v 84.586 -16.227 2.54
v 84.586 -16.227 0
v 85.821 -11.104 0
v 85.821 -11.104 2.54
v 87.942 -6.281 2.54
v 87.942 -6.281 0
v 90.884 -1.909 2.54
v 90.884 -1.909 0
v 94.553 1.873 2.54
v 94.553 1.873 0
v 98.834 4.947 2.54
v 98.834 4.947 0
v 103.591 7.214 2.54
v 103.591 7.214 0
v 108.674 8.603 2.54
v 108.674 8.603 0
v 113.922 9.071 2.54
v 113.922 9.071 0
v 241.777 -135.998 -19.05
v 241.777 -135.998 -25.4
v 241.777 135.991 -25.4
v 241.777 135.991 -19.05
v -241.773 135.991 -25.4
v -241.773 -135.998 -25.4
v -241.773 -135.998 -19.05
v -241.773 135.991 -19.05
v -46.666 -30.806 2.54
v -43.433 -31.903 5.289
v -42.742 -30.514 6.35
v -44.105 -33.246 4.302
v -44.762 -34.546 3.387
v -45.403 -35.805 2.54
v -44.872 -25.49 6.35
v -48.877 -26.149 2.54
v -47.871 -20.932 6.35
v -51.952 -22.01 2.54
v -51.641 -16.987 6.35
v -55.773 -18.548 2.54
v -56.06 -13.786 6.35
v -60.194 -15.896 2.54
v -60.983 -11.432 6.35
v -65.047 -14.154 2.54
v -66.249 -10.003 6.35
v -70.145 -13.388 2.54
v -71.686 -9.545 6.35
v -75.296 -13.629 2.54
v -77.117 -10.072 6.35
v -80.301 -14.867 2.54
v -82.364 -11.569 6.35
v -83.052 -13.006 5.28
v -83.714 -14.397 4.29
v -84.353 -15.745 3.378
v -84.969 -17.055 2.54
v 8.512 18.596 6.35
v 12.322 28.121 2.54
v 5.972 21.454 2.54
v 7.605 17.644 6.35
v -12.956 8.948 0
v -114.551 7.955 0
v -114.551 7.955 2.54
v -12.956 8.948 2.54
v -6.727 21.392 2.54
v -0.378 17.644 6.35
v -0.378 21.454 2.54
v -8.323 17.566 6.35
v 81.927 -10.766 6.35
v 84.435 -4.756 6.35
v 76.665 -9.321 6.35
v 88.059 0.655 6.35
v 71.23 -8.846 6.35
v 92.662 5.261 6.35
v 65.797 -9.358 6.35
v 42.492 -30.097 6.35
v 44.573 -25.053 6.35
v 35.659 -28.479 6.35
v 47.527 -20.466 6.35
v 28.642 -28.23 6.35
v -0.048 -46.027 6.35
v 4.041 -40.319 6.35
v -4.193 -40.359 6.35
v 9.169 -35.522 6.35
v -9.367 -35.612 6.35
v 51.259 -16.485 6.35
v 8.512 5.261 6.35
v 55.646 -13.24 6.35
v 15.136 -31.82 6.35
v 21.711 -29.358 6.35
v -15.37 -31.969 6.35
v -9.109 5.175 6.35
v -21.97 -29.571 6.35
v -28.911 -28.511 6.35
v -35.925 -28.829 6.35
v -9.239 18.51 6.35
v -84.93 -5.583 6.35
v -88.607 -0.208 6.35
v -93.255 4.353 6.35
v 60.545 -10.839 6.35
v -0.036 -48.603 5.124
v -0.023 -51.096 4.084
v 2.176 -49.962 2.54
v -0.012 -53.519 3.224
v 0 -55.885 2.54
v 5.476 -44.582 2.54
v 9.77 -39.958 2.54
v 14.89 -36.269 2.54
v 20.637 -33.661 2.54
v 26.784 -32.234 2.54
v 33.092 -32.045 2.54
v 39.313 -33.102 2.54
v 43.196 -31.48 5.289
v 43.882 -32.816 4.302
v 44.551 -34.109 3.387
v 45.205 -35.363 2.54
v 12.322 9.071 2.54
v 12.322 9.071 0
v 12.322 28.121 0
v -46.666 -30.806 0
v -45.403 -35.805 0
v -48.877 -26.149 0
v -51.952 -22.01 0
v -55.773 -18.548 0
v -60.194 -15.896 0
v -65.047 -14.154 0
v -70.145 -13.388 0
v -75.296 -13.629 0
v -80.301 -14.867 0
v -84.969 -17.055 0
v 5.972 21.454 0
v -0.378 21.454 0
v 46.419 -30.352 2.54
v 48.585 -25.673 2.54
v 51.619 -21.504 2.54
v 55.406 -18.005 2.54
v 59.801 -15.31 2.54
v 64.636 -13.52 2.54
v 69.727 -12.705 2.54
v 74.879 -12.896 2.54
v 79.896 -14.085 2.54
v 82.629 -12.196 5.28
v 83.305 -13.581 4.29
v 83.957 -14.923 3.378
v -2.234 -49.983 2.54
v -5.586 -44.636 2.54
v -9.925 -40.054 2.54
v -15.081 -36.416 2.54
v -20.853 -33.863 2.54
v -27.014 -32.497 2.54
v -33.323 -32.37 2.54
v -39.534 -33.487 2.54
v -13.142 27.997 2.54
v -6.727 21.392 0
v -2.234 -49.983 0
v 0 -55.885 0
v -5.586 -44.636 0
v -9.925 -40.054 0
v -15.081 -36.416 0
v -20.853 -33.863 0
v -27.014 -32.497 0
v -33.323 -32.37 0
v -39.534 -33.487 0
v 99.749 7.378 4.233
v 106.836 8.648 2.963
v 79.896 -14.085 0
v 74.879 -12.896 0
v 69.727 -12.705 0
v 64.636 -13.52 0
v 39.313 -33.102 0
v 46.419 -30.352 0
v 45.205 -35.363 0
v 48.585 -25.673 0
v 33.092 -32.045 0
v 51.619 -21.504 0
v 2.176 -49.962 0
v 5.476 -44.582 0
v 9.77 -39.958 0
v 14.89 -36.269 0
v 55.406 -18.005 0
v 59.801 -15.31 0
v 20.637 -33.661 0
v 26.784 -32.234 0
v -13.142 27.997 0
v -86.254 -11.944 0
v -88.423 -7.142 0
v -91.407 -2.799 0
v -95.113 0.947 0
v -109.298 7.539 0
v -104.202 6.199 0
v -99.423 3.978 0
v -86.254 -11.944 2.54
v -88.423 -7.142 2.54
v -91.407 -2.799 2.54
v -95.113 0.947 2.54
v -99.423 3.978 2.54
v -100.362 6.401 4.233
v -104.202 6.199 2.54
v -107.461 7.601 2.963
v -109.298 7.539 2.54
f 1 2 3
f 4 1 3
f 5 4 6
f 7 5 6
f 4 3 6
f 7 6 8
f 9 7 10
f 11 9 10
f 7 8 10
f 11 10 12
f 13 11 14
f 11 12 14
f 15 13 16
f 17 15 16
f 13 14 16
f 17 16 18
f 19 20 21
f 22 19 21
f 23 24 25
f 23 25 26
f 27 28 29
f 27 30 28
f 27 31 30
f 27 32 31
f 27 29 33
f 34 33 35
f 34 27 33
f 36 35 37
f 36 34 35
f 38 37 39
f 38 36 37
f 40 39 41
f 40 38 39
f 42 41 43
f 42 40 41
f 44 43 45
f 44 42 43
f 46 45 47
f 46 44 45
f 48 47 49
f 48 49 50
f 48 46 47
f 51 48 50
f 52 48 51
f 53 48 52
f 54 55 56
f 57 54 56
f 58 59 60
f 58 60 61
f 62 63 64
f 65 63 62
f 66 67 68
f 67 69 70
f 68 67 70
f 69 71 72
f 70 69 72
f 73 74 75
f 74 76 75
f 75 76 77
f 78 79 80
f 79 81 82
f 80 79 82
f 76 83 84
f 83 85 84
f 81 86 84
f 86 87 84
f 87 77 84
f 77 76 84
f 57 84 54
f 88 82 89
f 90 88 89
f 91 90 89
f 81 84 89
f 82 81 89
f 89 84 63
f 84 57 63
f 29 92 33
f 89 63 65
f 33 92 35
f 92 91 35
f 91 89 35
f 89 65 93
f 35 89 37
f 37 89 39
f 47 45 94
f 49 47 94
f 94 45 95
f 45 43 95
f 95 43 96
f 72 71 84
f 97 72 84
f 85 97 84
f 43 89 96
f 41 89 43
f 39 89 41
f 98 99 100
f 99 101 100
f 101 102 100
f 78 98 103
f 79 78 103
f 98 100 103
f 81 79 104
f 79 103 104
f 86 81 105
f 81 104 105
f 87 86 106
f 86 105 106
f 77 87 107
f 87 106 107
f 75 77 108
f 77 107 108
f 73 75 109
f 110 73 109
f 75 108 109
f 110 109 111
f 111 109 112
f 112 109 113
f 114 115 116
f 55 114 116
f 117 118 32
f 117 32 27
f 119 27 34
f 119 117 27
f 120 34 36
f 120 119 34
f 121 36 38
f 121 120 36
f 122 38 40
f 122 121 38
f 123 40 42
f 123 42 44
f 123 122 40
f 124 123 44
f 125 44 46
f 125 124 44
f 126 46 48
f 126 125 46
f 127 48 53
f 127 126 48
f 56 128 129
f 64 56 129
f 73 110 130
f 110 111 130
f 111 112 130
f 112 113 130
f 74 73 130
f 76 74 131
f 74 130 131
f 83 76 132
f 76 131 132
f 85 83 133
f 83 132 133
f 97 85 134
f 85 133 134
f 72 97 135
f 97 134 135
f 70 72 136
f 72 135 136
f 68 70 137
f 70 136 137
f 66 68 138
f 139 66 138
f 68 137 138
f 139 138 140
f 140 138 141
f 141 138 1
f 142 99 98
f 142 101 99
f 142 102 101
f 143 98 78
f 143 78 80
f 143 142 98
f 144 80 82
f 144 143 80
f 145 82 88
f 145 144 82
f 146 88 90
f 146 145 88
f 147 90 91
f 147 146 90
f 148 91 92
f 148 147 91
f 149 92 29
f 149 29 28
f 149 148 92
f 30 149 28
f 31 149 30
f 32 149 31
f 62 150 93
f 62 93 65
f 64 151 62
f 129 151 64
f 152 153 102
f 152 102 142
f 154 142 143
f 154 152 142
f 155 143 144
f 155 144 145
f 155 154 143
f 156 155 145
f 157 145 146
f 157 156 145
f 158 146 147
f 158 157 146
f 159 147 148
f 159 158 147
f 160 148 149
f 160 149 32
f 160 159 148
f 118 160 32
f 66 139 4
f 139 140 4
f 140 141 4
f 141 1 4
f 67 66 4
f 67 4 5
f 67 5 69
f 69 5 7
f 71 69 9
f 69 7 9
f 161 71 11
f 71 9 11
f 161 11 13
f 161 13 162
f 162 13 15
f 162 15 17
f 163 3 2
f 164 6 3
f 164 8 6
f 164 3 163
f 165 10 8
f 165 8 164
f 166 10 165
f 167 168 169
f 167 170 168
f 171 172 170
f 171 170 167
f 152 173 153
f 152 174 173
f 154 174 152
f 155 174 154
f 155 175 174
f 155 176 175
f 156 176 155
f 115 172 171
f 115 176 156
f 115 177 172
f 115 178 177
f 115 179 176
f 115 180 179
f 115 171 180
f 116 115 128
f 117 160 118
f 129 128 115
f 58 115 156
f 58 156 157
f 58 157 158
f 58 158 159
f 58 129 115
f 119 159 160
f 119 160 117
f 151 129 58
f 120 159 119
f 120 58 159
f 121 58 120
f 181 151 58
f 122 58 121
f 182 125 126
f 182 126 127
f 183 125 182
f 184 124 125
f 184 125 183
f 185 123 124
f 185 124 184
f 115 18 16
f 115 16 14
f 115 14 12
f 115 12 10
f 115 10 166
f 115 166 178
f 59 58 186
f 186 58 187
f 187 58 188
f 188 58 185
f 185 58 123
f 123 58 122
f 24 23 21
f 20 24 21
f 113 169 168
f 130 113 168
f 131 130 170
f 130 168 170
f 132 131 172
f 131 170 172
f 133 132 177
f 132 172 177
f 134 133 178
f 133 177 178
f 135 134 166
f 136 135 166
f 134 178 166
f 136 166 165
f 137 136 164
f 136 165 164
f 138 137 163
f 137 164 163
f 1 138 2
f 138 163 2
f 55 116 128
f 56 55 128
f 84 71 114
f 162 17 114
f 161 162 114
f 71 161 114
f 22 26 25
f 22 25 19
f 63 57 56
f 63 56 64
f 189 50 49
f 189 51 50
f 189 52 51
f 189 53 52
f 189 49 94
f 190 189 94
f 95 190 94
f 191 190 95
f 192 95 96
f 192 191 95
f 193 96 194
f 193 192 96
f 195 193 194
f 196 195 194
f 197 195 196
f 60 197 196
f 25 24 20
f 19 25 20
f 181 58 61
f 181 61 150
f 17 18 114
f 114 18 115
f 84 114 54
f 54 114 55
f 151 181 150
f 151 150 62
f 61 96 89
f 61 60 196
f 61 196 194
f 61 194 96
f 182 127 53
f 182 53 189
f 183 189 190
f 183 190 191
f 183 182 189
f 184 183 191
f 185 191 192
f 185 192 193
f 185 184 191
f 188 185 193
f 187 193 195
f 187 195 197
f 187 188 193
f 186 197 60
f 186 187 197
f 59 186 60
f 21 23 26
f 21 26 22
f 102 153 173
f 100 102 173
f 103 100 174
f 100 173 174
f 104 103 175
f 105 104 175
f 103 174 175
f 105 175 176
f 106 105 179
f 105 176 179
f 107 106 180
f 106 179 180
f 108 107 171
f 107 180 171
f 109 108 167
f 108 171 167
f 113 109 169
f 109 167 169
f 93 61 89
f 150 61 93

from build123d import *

# Parameters (mm, degrees)
F1_DEPTH = 6.35
F3_SIZE  = 3.81
F5_W     = 483.5504442453
F5_H     = 271.9896733761
F6_DEPTH = 6.35


with BuildPart() as f1:
    # F0 (on Top) → F1 (new body)
    with BuildSketch(Plane.XY):
        with BuildLine():
            Line((5.972245817, 21.453949254), (-0.377754183, 21.453949254))
            Line((-0.377754183, 21.453949254), (0, -55.885091424))
            ThreePointArc((0, -55.885091424), (17.6988021237, -34.8224985897), (45.2049598098, -35.3625938296))
            ThreePointArc((45.2049598098, -35.3625938296), (59.8006112137, -15.3096178799), (84.5859646797, -16.2267535925))
            ThreePointArc((84.5859646797, -16.2267535925), (94.5533505133, 1.8734329543), (113.922245817, 9.071448521))
            Line((113.922245817, 9.071448521), (12.322245817, 9.071448521))
            Line((12.322245817, 9.071448521), (12.322245817, 28.121448521))
            Line((12.322245817, 28.121448521), (5.972245817, 21.453949254))
        make_face()
    extrude(amount=F1_DEPTH)

    # F2: F1 across face


with BuildPart() as f1_1:
    add(f1.part)
    add(f1.part.mirror(Plane(origin=(-0.1888770915, -17.215571085, 3.175), x_dir=(0.0048843336, -0.9999880716, 0), z_dir=(-0.9999880716, -0.0048843336, 0))))

    # F3
    f3_edges = [f1_1.edges().sort_by_distance(p)[0] for p in [
        (12.322246, 18.596449, 6.35),
        (9.147246, 24.787699, 6.35),
        (2.797246, 21.453949, 6.35),
        (-3.552603, 21.422934, 6.35),
        (-9.934866, 24.694494, 6.35),
        (-13.049235, 18.472524, 6.35),
        (-63.753765, 8.451736, 6.35),
        (-95.113056, 0.947028, 6.35),
        (-60.194121, -15.895719, 6.35),
        (-17.903709, -34.996395, 6.35),
        (17.698802, -34.822499, 6.35),
        (59.800611, -15.309618, 6.35),
        (94.553351, 1.873433, 6.35),
        (63.122246, 9.071449, 6.35),
    ]]
    chamfer(f3_edges, length=F3_SIZE)


with BuildPart() as f6:
    # F5 (on offset) → F6 (new body)
    with BuildSketch(Plane.XY.offset(-25.4)):
        with Locations((0.0020489097, -0.003516674)):
            Rectangle(F5_W, F5_H)
    extrude(amount=F6_DEPTH)


solid = Compound([f1_1.part, f6.part])
